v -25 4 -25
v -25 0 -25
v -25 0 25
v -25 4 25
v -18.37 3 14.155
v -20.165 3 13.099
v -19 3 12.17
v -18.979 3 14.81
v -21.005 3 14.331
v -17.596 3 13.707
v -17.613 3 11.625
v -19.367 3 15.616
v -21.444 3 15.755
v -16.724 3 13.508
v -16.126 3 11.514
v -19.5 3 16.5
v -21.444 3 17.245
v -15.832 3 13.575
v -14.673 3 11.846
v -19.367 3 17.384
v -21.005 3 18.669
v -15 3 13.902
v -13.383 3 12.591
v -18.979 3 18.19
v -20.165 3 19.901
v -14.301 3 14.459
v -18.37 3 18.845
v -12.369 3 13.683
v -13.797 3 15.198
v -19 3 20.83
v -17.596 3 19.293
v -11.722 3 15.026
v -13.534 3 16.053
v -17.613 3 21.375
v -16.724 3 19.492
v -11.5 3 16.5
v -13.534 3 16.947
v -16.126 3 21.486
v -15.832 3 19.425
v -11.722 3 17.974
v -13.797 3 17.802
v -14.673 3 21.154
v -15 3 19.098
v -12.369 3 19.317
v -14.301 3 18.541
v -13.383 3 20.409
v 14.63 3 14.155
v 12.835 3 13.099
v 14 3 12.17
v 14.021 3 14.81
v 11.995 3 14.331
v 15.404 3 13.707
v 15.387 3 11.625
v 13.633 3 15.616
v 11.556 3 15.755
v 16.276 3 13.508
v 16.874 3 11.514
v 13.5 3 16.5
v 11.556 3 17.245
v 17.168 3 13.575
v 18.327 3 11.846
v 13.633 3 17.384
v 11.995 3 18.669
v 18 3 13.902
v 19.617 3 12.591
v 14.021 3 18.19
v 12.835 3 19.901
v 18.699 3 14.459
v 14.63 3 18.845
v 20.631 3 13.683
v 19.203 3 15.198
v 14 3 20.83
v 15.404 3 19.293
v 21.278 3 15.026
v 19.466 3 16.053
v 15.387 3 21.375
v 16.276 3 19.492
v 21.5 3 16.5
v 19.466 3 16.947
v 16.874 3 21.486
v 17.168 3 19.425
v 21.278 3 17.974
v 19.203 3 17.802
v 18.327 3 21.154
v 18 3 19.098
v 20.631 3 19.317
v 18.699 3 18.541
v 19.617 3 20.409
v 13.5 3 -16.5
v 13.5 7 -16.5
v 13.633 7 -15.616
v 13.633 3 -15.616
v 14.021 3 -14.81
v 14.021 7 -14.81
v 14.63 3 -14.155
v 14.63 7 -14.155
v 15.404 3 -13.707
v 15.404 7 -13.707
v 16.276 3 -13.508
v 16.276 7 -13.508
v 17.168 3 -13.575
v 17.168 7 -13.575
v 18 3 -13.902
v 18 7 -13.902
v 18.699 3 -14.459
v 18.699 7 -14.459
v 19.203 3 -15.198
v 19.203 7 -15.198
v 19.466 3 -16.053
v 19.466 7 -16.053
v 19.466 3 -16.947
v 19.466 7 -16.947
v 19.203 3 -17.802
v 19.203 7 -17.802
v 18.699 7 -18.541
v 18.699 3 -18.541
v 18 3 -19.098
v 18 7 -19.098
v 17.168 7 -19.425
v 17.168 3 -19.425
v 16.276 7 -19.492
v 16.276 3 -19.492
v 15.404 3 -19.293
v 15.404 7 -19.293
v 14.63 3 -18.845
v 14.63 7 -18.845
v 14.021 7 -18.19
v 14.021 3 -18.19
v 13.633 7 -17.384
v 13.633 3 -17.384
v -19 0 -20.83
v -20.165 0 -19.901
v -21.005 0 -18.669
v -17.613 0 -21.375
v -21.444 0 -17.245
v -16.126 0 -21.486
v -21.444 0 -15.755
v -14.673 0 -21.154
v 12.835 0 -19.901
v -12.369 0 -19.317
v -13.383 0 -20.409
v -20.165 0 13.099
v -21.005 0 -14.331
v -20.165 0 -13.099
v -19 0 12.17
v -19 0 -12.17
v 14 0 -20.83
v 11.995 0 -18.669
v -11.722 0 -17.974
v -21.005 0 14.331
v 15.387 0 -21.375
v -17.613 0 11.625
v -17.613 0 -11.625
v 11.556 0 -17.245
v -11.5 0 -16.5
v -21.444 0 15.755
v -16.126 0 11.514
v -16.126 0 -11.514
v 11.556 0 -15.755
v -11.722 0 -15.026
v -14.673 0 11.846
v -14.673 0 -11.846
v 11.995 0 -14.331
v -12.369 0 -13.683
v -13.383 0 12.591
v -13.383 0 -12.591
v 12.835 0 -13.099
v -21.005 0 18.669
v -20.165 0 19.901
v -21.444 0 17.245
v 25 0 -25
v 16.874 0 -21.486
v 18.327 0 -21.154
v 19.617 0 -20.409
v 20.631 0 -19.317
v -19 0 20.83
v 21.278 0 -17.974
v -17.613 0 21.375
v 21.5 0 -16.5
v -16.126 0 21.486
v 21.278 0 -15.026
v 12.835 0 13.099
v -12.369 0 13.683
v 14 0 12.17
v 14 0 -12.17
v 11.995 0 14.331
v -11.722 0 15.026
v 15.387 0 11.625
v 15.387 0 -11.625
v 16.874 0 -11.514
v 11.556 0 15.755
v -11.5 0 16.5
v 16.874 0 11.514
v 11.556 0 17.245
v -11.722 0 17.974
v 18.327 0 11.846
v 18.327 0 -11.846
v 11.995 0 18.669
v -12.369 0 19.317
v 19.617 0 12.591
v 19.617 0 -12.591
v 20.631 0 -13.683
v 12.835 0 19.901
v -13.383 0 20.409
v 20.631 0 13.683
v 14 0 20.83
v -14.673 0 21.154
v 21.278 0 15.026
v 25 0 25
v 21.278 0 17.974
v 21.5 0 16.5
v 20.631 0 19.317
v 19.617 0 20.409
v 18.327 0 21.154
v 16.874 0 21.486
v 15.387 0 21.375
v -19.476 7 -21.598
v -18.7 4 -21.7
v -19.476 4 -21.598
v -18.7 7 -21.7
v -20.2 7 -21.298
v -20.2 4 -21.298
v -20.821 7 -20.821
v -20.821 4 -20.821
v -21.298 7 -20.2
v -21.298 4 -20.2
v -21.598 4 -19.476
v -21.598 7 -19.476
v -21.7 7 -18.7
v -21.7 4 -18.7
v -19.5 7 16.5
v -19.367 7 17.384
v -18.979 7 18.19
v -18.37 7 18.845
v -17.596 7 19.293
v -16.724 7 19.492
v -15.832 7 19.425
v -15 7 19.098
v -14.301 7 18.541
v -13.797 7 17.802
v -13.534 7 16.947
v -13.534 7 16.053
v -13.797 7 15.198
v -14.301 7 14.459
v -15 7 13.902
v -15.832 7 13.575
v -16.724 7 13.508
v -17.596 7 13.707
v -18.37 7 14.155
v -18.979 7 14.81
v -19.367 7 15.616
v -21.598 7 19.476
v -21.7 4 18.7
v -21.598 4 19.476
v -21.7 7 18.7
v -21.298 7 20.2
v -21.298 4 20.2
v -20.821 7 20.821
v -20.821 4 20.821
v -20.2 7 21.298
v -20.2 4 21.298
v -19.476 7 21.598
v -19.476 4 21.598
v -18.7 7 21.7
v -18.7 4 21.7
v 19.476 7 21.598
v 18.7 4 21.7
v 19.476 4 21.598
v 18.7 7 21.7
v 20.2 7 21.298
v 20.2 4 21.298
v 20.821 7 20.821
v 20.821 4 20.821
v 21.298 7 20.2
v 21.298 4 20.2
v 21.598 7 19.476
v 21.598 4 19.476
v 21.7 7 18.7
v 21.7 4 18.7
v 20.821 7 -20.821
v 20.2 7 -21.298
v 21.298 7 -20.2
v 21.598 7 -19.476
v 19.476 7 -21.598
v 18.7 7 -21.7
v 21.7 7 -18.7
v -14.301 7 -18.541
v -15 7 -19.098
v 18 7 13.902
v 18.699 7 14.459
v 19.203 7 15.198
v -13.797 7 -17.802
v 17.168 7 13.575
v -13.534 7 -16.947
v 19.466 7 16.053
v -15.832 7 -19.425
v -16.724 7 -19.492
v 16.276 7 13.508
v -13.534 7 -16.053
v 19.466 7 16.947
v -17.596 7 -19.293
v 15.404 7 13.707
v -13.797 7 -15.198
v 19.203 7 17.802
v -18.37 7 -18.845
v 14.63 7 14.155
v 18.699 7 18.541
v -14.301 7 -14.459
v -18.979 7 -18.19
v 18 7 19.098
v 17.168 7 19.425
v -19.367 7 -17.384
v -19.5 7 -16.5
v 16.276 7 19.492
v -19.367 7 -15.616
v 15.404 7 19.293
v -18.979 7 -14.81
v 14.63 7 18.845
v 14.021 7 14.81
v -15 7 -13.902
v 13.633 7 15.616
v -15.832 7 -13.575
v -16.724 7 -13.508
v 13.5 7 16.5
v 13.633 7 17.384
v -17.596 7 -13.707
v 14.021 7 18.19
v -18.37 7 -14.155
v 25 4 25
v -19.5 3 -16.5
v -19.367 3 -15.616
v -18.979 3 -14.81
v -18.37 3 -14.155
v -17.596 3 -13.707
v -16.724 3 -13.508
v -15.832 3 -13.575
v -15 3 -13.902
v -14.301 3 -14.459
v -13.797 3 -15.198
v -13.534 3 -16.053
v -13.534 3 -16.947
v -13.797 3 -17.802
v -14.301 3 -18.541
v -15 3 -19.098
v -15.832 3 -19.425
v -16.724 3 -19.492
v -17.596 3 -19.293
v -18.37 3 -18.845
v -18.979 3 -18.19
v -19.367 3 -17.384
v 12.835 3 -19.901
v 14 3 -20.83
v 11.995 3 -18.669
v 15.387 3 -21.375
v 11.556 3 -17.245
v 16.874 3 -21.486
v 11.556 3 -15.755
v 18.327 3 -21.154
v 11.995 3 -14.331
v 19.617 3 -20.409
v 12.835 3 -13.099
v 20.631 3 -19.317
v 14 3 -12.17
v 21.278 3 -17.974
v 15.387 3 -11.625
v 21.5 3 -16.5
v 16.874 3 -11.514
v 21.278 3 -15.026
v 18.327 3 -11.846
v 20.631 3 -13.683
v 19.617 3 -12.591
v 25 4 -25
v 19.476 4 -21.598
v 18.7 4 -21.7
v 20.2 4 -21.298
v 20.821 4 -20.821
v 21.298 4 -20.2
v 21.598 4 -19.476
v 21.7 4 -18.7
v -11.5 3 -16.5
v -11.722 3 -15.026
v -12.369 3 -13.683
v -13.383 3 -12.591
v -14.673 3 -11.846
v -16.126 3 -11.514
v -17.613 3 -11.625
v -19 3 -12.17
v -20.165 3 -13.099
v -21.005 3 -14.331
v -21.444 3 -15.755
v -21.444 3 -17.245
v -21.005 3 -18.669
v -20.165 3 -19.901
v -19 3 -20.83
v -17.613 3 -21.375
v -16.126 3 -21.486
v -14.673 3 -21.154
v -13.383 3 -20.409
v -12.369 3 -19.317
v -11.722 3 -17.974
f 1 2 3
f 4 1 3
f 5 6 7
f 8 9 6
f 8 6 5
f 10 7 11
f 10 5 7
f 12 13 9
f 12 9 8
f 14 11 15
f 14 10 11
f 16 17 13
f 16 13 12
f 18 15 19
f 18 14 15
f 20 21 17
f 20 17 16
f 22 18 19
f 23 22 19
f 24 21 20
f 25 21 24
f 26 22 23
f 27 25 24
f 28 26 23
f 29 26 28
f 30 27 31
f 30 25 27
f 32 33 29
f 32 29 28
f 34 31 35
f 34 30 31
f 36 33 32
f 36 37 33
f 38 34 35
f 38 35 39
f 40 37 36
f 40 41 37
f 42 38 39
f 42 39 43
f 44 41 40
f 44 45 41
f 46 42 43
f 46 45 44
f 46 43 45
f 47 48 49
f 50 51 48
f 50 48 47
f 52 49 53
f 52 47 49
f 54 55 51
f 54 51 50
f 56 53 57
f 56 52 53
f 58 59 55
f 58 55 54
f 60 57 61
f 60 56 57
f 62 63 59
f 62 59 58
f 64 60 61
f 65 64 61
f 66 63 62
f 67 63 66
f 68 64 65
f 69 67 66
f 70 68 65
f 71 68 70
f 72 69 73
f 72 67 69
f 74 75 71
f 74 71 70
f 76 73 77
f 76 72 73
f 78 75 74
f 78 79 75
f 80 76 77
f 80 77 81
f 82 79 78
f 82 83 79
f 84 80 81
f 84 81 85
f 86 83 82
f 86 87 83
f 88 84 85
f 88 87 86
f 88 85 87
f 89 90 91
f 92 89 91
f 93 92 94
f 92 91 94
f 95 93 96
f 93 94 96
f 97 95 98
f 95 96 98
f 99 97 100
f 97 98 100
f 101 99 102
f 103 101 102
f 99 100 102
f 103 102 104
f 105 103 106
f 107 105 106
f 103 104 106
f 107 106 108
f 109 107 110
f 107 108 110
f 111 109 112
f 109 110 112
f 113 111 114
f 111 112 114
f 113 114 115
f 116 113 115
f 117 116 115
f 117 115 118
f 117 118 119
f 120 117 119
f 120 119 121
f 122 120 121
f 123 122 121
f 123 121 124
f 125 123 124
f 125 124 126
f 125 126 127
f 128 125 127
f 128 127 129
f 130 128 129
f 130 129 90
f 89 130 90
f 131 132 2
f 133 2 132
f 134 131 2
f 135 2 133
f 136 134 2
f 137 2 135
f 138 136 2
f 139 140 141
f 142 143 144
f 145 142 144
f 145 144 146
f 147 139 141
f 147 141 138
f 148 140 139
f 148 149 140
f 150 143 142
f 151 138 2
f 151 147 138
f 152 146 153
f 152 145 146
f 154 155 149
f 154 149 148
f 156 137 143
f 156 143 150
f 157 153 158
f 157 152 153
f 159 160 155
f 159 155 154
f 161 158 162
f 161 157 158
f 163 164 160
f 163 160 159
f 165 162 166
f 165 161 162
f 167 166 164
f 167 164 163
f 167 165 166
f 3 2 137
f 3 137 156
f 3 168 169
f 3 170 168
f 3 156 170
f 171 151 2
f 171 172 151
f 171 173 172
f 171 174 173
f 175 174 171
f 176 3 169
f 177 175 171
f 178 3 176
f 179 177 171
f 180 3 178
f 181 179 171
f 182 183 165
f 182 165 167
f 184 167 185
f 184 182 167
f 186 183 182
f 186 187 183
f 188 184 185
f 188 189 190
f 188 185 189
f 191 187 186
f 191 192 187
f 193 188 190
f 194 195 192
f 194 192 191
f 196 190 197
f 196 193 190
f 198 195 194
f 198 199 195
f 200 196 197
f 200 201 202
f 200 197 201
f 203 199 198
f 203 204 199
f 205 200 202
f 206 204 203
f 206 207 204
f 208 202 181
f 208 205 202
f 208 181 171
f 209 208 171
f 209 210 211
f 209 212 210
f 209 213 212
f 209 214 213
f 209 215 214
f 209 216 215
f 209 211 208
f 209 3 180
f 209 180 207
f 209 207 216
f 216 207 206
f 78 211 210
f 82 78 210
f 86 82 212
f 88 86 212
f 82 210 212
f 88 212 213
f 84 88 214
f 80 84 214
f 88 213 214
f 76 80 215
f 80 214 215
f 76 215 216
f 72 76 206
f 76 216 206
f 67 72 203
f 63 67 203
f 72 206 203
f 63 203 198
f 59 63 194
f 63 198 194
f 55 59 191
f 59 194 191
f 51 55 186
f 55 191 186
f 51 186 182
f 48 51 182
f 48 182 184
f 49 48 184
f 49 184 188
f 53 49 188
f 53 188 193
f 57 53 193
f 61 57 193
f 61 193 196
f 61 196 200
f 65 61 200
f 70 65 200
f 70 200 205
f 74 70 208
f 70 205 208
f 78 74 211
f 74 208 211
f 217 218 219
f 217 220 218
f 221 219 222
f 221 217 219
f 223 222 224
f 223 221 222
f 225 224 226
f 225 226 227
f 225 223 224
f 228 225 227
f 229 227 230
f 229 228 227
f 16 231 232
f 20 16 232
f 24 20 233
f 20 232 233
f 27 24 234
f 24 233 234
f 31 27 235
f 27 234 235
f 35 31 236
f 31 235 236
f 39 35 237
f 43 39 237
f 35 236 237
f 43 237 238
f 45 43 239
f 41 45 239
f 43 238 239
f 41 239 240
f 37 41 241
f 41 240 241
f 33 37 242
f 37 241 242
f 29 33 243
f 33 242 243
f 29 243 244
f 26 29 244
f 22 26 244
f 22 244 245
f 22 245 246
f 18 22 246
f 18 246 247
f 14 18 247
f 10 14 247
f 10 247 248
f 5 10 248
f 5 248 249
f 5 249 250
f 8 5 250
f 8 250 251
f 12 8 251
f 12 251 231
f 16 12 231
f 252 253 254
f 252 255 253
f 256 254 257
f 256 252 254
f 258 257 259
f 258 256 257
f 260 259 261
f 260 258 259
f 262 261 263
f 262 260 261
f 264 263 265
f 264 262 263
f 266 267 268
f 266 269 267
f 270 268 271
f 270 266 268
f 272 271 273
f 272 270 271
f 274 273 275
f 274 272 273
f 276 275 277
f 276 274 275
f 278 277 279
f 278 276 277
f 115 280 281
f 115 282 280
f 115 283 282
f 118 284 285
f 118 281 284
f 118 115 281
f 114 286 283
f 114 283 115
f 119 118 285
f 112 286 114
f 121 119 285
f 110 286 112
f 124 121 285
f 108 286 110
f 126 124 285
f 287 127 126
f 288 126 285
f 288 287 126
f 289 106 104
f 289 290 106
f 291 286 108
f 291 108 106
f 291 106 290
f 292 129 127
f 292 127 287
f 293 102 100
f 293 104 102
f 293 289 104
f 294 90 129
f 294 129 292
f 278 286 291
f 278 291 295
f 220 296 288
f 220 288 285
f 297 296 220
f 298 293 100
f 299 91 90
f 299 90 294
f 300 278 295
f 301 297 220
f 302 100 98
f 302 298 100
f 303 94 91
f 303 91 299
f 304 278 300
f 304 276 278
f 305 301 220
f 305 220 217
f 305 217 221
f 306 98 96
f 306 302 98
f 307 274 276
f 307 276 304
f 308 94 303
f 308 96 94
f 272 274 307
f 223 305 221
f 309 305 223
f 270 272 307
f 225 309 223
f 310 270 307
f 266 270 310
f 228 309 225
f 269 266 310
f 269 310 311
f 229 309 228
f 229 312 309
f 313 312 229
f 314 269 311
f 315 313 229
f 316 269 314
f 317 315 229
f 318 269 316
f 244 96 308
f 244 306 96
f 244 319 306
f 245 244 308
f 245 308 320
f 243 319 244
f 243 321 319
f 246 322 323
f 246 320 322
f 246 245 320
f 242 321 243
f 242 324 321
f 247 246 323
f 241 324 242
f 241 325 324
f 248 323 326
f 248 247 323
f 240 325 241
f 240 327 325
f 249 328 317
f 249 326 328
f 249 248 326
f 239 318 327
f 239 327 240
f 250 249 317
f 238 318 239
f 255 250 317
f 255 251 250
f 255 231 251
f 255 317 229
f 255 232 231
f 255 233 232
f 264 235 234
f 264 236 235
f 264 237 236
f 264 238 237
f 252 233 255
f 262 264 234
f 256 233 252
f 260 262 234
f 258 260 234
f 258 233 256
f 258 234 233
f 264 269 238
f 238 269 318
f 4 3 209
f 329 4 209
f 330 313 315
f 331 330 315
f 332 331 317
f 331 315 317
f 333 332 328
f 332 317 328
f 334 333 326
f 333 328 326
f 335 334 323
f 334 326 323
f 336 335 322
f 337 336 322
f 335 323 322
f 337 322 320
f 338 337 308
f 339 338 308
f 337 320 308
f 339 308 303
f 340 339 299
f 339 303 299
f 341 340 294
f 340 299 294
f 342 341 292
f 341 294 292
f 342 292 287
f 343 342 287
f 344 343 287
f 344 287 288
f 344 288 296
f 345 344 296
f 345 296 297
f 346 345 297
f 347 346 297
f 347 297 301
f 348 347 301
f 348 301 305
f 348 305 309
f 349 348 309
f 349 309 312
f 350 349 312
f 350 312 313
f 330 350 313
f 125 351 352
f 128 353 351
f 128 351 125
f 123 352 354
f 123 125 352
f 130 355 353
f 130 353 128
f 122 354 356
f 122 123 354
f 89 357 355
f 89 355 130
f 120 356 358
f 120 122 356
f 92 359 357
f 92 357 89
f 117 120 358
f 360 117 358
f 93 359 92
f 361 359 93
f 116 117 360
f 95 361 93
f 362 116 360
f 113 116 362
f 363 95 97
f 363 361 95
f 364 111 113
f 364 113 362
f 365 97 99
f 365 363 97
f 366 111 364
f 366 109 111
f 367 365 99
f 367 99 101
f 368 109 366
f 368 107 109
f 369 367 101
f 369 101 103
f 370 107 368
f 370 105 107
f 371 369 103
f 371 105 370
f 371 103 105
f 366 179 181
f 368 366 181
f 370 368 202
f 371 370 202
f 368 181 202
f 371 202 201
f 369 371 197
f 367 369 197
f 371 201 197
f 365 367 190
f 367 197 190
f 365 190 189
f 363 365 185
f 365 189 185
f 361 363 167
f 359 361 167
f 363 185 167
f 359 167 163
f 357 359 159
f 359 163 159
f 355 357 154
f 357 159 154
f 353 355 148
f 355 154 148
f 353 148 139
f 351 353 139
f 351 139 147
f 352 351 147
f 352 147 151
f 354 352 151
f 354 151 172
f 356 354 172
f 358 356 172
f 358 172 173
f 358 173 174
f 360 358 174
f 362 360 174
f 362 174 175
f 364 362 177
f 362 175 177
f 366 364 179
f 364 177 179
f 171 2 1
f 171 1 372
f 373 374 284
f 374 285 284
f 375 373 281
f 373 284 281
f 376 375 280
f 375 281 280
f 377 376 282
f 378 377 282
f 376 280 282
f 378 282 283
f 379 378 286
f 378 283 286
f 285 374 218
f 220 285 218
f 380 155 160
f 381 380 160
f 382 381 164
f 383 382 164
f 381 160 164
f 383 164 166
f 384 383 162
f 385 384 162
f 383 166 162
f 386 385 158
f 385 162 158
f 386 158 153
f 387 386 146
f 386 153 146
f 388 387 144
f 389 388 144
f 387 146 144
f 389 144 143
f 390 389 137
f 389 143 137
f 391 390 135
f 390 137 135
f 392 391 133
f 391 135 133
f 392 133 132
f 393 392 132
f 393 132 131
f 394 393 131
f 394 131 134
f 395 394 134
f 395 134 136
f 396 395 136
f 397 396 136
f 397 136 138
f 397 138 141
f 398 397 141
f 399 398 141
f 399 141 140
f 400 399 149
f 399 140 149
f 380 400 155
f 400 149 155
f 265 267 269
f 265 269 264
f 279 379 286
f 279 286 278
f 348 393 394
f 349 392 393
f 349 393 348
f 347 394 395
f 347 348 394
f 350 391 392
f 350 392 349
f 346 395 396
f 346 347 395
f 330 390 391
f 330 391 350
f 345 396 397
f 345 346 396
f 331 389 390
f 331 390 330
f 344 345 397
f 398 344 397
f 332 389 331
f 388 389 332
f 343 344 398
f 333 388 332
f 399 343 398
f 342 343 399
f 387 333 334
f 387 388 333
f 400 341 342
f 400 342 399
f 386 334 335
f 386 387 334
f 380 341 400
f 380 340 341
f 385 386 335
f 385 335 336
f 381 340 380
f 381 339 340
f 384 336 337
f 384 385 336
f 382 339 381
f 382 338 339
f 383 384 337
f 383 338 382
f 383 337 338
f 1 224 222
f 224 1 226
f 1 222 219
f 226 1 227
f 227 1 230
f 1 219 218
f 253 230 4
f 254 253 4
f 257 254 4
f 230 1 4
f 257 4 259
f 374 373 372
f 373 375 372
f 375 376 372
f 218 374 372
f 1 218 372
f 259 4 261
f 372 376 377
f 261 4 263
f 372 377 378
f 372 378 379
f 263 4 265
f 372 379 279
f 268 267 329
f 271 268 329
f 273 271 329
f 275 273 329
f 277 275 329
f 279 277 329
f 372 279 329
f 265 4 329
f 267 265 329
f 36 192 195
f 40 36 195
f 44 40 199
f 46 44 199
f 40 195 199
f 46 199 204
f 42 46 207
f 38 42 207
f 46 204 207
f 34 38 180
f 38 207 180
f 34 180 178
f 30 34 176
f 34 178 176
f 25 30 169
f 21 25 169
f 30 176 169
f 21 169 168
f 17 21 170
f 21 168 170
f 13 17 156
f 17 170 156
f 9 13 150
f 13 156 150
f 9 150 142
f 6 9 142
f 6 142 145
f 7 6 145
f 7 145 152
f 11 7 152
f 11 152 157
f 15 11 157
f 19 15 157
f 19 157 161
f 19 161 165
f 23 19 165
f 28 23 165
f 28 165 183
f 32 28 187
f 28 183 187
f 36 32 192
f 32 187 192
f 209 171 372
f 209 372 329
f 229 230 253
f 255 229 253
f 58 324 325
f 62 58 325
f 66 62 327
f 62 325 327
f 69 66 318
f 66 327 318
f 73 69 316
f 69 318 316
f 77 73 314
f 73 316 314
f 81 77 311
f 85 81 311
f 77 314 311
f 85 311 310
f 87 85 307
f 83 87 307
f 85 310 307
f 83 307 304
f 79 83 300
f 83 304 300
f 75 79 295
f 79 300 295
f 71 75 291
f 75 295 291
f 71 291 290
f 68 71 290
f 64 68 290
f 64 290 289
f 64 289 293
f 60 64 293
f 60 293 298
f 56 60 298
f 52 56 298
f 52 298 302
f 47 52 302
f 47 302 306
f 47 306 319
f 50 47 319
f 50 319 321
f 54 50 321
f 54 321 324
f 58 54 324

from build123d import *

# Parameters (mm, degrees)
F0_W     = 50
F0_H     = 50
F1_DEPTH = 4
F2_W     = 43.4
F2_H     = 43.4
F3_DEPTH = 3
F4_R     = 3
F5_DEPTH = 25
F6_R     = 5
F6_R_2   = 3
F7_DEPTH = 3
F8_R     = 3


# Not quite as in the source:
# - a feature names something its author has since deleted; it is built from what else it names


with BuildPart() as f1:
    # F0 (on Front) → F1 (new body)
    with BuildSketch(Plane.XZ):
        Rectangle(F0_W, F0_H)
    extrude(amount=-F1_DEPTH)

    # F2 (on face) → F3 (join)
    with BuildSketch(Plane(origin=(0, 4, 0), x_dir=(-1, 0, 0), z_dir=(0, 1, 0))):
        Rectangle(F2_W, F2_H)
    extrude(amount=F3_DEPTH)

    # F4 (on face) → F5 (cut)
    with BuildSketch(Plane(origin=(0, 7, 0), x_dir=(-1, 0, 0), z_dir=(0, 1, 0))):
        with Locations((-16.5, 16.5)):
            Circle(F4_R)
        with Locations((16.5, 16.5)):
            Circle(F4_R)
        with Locations((16.5, -16.5)):
            Circle(F4_R)
        with Locations((-16.5, -16.5)):
            Circle(F4_R)
    extrude(amount=-F5_DEPTH, mode=Mode.SUBTRACT)

    # F6 (on face) → F7 (cut)
    with BuildSketch(Plane.XZ):
        with Locations((-16.5, 16.5)):
            Circle(F6_R)
        with Locations((-16.5, 16.5)):
            Circle(F6_R_2, mode=Mode.SUBTRACT)
        with Locations((16.5, 16.5)):
            Circle(F6_R)
        with Locations((16.5, 16.5)):
            Circle(F6_R_2, mode=Mode.SUBTRACT)
        with Locations((16.5, -16.5)):
            Circle(F6_R)
        with Locations((16.5, -16.5)):
            Circle(F6_R_2, mode=Mode.SUBTRACT)
        with Locations((-16.5, -16.5)):
            Circle(F6_R)
        with Locations((-16.5, -16.5)):
            Circle(F6_R_2, mode=Mode.SUBTRACT)
    extrude(amount=-F7_DEPTH, mode=Mode.SUBTRACT)

    # F8
    f8_edges = [f1.edges().sort_by_distance(p)[0] for p in [
        (21.7, 5.5, 21.7),
        (-21.7, 5.5, 21.7),
        (-21.7, 5.5, -21.7),
        (21.7, 5.5, -21.7),
    ]]
    fillet(f8_edges, radius=F8_R)


solid = f1.part
